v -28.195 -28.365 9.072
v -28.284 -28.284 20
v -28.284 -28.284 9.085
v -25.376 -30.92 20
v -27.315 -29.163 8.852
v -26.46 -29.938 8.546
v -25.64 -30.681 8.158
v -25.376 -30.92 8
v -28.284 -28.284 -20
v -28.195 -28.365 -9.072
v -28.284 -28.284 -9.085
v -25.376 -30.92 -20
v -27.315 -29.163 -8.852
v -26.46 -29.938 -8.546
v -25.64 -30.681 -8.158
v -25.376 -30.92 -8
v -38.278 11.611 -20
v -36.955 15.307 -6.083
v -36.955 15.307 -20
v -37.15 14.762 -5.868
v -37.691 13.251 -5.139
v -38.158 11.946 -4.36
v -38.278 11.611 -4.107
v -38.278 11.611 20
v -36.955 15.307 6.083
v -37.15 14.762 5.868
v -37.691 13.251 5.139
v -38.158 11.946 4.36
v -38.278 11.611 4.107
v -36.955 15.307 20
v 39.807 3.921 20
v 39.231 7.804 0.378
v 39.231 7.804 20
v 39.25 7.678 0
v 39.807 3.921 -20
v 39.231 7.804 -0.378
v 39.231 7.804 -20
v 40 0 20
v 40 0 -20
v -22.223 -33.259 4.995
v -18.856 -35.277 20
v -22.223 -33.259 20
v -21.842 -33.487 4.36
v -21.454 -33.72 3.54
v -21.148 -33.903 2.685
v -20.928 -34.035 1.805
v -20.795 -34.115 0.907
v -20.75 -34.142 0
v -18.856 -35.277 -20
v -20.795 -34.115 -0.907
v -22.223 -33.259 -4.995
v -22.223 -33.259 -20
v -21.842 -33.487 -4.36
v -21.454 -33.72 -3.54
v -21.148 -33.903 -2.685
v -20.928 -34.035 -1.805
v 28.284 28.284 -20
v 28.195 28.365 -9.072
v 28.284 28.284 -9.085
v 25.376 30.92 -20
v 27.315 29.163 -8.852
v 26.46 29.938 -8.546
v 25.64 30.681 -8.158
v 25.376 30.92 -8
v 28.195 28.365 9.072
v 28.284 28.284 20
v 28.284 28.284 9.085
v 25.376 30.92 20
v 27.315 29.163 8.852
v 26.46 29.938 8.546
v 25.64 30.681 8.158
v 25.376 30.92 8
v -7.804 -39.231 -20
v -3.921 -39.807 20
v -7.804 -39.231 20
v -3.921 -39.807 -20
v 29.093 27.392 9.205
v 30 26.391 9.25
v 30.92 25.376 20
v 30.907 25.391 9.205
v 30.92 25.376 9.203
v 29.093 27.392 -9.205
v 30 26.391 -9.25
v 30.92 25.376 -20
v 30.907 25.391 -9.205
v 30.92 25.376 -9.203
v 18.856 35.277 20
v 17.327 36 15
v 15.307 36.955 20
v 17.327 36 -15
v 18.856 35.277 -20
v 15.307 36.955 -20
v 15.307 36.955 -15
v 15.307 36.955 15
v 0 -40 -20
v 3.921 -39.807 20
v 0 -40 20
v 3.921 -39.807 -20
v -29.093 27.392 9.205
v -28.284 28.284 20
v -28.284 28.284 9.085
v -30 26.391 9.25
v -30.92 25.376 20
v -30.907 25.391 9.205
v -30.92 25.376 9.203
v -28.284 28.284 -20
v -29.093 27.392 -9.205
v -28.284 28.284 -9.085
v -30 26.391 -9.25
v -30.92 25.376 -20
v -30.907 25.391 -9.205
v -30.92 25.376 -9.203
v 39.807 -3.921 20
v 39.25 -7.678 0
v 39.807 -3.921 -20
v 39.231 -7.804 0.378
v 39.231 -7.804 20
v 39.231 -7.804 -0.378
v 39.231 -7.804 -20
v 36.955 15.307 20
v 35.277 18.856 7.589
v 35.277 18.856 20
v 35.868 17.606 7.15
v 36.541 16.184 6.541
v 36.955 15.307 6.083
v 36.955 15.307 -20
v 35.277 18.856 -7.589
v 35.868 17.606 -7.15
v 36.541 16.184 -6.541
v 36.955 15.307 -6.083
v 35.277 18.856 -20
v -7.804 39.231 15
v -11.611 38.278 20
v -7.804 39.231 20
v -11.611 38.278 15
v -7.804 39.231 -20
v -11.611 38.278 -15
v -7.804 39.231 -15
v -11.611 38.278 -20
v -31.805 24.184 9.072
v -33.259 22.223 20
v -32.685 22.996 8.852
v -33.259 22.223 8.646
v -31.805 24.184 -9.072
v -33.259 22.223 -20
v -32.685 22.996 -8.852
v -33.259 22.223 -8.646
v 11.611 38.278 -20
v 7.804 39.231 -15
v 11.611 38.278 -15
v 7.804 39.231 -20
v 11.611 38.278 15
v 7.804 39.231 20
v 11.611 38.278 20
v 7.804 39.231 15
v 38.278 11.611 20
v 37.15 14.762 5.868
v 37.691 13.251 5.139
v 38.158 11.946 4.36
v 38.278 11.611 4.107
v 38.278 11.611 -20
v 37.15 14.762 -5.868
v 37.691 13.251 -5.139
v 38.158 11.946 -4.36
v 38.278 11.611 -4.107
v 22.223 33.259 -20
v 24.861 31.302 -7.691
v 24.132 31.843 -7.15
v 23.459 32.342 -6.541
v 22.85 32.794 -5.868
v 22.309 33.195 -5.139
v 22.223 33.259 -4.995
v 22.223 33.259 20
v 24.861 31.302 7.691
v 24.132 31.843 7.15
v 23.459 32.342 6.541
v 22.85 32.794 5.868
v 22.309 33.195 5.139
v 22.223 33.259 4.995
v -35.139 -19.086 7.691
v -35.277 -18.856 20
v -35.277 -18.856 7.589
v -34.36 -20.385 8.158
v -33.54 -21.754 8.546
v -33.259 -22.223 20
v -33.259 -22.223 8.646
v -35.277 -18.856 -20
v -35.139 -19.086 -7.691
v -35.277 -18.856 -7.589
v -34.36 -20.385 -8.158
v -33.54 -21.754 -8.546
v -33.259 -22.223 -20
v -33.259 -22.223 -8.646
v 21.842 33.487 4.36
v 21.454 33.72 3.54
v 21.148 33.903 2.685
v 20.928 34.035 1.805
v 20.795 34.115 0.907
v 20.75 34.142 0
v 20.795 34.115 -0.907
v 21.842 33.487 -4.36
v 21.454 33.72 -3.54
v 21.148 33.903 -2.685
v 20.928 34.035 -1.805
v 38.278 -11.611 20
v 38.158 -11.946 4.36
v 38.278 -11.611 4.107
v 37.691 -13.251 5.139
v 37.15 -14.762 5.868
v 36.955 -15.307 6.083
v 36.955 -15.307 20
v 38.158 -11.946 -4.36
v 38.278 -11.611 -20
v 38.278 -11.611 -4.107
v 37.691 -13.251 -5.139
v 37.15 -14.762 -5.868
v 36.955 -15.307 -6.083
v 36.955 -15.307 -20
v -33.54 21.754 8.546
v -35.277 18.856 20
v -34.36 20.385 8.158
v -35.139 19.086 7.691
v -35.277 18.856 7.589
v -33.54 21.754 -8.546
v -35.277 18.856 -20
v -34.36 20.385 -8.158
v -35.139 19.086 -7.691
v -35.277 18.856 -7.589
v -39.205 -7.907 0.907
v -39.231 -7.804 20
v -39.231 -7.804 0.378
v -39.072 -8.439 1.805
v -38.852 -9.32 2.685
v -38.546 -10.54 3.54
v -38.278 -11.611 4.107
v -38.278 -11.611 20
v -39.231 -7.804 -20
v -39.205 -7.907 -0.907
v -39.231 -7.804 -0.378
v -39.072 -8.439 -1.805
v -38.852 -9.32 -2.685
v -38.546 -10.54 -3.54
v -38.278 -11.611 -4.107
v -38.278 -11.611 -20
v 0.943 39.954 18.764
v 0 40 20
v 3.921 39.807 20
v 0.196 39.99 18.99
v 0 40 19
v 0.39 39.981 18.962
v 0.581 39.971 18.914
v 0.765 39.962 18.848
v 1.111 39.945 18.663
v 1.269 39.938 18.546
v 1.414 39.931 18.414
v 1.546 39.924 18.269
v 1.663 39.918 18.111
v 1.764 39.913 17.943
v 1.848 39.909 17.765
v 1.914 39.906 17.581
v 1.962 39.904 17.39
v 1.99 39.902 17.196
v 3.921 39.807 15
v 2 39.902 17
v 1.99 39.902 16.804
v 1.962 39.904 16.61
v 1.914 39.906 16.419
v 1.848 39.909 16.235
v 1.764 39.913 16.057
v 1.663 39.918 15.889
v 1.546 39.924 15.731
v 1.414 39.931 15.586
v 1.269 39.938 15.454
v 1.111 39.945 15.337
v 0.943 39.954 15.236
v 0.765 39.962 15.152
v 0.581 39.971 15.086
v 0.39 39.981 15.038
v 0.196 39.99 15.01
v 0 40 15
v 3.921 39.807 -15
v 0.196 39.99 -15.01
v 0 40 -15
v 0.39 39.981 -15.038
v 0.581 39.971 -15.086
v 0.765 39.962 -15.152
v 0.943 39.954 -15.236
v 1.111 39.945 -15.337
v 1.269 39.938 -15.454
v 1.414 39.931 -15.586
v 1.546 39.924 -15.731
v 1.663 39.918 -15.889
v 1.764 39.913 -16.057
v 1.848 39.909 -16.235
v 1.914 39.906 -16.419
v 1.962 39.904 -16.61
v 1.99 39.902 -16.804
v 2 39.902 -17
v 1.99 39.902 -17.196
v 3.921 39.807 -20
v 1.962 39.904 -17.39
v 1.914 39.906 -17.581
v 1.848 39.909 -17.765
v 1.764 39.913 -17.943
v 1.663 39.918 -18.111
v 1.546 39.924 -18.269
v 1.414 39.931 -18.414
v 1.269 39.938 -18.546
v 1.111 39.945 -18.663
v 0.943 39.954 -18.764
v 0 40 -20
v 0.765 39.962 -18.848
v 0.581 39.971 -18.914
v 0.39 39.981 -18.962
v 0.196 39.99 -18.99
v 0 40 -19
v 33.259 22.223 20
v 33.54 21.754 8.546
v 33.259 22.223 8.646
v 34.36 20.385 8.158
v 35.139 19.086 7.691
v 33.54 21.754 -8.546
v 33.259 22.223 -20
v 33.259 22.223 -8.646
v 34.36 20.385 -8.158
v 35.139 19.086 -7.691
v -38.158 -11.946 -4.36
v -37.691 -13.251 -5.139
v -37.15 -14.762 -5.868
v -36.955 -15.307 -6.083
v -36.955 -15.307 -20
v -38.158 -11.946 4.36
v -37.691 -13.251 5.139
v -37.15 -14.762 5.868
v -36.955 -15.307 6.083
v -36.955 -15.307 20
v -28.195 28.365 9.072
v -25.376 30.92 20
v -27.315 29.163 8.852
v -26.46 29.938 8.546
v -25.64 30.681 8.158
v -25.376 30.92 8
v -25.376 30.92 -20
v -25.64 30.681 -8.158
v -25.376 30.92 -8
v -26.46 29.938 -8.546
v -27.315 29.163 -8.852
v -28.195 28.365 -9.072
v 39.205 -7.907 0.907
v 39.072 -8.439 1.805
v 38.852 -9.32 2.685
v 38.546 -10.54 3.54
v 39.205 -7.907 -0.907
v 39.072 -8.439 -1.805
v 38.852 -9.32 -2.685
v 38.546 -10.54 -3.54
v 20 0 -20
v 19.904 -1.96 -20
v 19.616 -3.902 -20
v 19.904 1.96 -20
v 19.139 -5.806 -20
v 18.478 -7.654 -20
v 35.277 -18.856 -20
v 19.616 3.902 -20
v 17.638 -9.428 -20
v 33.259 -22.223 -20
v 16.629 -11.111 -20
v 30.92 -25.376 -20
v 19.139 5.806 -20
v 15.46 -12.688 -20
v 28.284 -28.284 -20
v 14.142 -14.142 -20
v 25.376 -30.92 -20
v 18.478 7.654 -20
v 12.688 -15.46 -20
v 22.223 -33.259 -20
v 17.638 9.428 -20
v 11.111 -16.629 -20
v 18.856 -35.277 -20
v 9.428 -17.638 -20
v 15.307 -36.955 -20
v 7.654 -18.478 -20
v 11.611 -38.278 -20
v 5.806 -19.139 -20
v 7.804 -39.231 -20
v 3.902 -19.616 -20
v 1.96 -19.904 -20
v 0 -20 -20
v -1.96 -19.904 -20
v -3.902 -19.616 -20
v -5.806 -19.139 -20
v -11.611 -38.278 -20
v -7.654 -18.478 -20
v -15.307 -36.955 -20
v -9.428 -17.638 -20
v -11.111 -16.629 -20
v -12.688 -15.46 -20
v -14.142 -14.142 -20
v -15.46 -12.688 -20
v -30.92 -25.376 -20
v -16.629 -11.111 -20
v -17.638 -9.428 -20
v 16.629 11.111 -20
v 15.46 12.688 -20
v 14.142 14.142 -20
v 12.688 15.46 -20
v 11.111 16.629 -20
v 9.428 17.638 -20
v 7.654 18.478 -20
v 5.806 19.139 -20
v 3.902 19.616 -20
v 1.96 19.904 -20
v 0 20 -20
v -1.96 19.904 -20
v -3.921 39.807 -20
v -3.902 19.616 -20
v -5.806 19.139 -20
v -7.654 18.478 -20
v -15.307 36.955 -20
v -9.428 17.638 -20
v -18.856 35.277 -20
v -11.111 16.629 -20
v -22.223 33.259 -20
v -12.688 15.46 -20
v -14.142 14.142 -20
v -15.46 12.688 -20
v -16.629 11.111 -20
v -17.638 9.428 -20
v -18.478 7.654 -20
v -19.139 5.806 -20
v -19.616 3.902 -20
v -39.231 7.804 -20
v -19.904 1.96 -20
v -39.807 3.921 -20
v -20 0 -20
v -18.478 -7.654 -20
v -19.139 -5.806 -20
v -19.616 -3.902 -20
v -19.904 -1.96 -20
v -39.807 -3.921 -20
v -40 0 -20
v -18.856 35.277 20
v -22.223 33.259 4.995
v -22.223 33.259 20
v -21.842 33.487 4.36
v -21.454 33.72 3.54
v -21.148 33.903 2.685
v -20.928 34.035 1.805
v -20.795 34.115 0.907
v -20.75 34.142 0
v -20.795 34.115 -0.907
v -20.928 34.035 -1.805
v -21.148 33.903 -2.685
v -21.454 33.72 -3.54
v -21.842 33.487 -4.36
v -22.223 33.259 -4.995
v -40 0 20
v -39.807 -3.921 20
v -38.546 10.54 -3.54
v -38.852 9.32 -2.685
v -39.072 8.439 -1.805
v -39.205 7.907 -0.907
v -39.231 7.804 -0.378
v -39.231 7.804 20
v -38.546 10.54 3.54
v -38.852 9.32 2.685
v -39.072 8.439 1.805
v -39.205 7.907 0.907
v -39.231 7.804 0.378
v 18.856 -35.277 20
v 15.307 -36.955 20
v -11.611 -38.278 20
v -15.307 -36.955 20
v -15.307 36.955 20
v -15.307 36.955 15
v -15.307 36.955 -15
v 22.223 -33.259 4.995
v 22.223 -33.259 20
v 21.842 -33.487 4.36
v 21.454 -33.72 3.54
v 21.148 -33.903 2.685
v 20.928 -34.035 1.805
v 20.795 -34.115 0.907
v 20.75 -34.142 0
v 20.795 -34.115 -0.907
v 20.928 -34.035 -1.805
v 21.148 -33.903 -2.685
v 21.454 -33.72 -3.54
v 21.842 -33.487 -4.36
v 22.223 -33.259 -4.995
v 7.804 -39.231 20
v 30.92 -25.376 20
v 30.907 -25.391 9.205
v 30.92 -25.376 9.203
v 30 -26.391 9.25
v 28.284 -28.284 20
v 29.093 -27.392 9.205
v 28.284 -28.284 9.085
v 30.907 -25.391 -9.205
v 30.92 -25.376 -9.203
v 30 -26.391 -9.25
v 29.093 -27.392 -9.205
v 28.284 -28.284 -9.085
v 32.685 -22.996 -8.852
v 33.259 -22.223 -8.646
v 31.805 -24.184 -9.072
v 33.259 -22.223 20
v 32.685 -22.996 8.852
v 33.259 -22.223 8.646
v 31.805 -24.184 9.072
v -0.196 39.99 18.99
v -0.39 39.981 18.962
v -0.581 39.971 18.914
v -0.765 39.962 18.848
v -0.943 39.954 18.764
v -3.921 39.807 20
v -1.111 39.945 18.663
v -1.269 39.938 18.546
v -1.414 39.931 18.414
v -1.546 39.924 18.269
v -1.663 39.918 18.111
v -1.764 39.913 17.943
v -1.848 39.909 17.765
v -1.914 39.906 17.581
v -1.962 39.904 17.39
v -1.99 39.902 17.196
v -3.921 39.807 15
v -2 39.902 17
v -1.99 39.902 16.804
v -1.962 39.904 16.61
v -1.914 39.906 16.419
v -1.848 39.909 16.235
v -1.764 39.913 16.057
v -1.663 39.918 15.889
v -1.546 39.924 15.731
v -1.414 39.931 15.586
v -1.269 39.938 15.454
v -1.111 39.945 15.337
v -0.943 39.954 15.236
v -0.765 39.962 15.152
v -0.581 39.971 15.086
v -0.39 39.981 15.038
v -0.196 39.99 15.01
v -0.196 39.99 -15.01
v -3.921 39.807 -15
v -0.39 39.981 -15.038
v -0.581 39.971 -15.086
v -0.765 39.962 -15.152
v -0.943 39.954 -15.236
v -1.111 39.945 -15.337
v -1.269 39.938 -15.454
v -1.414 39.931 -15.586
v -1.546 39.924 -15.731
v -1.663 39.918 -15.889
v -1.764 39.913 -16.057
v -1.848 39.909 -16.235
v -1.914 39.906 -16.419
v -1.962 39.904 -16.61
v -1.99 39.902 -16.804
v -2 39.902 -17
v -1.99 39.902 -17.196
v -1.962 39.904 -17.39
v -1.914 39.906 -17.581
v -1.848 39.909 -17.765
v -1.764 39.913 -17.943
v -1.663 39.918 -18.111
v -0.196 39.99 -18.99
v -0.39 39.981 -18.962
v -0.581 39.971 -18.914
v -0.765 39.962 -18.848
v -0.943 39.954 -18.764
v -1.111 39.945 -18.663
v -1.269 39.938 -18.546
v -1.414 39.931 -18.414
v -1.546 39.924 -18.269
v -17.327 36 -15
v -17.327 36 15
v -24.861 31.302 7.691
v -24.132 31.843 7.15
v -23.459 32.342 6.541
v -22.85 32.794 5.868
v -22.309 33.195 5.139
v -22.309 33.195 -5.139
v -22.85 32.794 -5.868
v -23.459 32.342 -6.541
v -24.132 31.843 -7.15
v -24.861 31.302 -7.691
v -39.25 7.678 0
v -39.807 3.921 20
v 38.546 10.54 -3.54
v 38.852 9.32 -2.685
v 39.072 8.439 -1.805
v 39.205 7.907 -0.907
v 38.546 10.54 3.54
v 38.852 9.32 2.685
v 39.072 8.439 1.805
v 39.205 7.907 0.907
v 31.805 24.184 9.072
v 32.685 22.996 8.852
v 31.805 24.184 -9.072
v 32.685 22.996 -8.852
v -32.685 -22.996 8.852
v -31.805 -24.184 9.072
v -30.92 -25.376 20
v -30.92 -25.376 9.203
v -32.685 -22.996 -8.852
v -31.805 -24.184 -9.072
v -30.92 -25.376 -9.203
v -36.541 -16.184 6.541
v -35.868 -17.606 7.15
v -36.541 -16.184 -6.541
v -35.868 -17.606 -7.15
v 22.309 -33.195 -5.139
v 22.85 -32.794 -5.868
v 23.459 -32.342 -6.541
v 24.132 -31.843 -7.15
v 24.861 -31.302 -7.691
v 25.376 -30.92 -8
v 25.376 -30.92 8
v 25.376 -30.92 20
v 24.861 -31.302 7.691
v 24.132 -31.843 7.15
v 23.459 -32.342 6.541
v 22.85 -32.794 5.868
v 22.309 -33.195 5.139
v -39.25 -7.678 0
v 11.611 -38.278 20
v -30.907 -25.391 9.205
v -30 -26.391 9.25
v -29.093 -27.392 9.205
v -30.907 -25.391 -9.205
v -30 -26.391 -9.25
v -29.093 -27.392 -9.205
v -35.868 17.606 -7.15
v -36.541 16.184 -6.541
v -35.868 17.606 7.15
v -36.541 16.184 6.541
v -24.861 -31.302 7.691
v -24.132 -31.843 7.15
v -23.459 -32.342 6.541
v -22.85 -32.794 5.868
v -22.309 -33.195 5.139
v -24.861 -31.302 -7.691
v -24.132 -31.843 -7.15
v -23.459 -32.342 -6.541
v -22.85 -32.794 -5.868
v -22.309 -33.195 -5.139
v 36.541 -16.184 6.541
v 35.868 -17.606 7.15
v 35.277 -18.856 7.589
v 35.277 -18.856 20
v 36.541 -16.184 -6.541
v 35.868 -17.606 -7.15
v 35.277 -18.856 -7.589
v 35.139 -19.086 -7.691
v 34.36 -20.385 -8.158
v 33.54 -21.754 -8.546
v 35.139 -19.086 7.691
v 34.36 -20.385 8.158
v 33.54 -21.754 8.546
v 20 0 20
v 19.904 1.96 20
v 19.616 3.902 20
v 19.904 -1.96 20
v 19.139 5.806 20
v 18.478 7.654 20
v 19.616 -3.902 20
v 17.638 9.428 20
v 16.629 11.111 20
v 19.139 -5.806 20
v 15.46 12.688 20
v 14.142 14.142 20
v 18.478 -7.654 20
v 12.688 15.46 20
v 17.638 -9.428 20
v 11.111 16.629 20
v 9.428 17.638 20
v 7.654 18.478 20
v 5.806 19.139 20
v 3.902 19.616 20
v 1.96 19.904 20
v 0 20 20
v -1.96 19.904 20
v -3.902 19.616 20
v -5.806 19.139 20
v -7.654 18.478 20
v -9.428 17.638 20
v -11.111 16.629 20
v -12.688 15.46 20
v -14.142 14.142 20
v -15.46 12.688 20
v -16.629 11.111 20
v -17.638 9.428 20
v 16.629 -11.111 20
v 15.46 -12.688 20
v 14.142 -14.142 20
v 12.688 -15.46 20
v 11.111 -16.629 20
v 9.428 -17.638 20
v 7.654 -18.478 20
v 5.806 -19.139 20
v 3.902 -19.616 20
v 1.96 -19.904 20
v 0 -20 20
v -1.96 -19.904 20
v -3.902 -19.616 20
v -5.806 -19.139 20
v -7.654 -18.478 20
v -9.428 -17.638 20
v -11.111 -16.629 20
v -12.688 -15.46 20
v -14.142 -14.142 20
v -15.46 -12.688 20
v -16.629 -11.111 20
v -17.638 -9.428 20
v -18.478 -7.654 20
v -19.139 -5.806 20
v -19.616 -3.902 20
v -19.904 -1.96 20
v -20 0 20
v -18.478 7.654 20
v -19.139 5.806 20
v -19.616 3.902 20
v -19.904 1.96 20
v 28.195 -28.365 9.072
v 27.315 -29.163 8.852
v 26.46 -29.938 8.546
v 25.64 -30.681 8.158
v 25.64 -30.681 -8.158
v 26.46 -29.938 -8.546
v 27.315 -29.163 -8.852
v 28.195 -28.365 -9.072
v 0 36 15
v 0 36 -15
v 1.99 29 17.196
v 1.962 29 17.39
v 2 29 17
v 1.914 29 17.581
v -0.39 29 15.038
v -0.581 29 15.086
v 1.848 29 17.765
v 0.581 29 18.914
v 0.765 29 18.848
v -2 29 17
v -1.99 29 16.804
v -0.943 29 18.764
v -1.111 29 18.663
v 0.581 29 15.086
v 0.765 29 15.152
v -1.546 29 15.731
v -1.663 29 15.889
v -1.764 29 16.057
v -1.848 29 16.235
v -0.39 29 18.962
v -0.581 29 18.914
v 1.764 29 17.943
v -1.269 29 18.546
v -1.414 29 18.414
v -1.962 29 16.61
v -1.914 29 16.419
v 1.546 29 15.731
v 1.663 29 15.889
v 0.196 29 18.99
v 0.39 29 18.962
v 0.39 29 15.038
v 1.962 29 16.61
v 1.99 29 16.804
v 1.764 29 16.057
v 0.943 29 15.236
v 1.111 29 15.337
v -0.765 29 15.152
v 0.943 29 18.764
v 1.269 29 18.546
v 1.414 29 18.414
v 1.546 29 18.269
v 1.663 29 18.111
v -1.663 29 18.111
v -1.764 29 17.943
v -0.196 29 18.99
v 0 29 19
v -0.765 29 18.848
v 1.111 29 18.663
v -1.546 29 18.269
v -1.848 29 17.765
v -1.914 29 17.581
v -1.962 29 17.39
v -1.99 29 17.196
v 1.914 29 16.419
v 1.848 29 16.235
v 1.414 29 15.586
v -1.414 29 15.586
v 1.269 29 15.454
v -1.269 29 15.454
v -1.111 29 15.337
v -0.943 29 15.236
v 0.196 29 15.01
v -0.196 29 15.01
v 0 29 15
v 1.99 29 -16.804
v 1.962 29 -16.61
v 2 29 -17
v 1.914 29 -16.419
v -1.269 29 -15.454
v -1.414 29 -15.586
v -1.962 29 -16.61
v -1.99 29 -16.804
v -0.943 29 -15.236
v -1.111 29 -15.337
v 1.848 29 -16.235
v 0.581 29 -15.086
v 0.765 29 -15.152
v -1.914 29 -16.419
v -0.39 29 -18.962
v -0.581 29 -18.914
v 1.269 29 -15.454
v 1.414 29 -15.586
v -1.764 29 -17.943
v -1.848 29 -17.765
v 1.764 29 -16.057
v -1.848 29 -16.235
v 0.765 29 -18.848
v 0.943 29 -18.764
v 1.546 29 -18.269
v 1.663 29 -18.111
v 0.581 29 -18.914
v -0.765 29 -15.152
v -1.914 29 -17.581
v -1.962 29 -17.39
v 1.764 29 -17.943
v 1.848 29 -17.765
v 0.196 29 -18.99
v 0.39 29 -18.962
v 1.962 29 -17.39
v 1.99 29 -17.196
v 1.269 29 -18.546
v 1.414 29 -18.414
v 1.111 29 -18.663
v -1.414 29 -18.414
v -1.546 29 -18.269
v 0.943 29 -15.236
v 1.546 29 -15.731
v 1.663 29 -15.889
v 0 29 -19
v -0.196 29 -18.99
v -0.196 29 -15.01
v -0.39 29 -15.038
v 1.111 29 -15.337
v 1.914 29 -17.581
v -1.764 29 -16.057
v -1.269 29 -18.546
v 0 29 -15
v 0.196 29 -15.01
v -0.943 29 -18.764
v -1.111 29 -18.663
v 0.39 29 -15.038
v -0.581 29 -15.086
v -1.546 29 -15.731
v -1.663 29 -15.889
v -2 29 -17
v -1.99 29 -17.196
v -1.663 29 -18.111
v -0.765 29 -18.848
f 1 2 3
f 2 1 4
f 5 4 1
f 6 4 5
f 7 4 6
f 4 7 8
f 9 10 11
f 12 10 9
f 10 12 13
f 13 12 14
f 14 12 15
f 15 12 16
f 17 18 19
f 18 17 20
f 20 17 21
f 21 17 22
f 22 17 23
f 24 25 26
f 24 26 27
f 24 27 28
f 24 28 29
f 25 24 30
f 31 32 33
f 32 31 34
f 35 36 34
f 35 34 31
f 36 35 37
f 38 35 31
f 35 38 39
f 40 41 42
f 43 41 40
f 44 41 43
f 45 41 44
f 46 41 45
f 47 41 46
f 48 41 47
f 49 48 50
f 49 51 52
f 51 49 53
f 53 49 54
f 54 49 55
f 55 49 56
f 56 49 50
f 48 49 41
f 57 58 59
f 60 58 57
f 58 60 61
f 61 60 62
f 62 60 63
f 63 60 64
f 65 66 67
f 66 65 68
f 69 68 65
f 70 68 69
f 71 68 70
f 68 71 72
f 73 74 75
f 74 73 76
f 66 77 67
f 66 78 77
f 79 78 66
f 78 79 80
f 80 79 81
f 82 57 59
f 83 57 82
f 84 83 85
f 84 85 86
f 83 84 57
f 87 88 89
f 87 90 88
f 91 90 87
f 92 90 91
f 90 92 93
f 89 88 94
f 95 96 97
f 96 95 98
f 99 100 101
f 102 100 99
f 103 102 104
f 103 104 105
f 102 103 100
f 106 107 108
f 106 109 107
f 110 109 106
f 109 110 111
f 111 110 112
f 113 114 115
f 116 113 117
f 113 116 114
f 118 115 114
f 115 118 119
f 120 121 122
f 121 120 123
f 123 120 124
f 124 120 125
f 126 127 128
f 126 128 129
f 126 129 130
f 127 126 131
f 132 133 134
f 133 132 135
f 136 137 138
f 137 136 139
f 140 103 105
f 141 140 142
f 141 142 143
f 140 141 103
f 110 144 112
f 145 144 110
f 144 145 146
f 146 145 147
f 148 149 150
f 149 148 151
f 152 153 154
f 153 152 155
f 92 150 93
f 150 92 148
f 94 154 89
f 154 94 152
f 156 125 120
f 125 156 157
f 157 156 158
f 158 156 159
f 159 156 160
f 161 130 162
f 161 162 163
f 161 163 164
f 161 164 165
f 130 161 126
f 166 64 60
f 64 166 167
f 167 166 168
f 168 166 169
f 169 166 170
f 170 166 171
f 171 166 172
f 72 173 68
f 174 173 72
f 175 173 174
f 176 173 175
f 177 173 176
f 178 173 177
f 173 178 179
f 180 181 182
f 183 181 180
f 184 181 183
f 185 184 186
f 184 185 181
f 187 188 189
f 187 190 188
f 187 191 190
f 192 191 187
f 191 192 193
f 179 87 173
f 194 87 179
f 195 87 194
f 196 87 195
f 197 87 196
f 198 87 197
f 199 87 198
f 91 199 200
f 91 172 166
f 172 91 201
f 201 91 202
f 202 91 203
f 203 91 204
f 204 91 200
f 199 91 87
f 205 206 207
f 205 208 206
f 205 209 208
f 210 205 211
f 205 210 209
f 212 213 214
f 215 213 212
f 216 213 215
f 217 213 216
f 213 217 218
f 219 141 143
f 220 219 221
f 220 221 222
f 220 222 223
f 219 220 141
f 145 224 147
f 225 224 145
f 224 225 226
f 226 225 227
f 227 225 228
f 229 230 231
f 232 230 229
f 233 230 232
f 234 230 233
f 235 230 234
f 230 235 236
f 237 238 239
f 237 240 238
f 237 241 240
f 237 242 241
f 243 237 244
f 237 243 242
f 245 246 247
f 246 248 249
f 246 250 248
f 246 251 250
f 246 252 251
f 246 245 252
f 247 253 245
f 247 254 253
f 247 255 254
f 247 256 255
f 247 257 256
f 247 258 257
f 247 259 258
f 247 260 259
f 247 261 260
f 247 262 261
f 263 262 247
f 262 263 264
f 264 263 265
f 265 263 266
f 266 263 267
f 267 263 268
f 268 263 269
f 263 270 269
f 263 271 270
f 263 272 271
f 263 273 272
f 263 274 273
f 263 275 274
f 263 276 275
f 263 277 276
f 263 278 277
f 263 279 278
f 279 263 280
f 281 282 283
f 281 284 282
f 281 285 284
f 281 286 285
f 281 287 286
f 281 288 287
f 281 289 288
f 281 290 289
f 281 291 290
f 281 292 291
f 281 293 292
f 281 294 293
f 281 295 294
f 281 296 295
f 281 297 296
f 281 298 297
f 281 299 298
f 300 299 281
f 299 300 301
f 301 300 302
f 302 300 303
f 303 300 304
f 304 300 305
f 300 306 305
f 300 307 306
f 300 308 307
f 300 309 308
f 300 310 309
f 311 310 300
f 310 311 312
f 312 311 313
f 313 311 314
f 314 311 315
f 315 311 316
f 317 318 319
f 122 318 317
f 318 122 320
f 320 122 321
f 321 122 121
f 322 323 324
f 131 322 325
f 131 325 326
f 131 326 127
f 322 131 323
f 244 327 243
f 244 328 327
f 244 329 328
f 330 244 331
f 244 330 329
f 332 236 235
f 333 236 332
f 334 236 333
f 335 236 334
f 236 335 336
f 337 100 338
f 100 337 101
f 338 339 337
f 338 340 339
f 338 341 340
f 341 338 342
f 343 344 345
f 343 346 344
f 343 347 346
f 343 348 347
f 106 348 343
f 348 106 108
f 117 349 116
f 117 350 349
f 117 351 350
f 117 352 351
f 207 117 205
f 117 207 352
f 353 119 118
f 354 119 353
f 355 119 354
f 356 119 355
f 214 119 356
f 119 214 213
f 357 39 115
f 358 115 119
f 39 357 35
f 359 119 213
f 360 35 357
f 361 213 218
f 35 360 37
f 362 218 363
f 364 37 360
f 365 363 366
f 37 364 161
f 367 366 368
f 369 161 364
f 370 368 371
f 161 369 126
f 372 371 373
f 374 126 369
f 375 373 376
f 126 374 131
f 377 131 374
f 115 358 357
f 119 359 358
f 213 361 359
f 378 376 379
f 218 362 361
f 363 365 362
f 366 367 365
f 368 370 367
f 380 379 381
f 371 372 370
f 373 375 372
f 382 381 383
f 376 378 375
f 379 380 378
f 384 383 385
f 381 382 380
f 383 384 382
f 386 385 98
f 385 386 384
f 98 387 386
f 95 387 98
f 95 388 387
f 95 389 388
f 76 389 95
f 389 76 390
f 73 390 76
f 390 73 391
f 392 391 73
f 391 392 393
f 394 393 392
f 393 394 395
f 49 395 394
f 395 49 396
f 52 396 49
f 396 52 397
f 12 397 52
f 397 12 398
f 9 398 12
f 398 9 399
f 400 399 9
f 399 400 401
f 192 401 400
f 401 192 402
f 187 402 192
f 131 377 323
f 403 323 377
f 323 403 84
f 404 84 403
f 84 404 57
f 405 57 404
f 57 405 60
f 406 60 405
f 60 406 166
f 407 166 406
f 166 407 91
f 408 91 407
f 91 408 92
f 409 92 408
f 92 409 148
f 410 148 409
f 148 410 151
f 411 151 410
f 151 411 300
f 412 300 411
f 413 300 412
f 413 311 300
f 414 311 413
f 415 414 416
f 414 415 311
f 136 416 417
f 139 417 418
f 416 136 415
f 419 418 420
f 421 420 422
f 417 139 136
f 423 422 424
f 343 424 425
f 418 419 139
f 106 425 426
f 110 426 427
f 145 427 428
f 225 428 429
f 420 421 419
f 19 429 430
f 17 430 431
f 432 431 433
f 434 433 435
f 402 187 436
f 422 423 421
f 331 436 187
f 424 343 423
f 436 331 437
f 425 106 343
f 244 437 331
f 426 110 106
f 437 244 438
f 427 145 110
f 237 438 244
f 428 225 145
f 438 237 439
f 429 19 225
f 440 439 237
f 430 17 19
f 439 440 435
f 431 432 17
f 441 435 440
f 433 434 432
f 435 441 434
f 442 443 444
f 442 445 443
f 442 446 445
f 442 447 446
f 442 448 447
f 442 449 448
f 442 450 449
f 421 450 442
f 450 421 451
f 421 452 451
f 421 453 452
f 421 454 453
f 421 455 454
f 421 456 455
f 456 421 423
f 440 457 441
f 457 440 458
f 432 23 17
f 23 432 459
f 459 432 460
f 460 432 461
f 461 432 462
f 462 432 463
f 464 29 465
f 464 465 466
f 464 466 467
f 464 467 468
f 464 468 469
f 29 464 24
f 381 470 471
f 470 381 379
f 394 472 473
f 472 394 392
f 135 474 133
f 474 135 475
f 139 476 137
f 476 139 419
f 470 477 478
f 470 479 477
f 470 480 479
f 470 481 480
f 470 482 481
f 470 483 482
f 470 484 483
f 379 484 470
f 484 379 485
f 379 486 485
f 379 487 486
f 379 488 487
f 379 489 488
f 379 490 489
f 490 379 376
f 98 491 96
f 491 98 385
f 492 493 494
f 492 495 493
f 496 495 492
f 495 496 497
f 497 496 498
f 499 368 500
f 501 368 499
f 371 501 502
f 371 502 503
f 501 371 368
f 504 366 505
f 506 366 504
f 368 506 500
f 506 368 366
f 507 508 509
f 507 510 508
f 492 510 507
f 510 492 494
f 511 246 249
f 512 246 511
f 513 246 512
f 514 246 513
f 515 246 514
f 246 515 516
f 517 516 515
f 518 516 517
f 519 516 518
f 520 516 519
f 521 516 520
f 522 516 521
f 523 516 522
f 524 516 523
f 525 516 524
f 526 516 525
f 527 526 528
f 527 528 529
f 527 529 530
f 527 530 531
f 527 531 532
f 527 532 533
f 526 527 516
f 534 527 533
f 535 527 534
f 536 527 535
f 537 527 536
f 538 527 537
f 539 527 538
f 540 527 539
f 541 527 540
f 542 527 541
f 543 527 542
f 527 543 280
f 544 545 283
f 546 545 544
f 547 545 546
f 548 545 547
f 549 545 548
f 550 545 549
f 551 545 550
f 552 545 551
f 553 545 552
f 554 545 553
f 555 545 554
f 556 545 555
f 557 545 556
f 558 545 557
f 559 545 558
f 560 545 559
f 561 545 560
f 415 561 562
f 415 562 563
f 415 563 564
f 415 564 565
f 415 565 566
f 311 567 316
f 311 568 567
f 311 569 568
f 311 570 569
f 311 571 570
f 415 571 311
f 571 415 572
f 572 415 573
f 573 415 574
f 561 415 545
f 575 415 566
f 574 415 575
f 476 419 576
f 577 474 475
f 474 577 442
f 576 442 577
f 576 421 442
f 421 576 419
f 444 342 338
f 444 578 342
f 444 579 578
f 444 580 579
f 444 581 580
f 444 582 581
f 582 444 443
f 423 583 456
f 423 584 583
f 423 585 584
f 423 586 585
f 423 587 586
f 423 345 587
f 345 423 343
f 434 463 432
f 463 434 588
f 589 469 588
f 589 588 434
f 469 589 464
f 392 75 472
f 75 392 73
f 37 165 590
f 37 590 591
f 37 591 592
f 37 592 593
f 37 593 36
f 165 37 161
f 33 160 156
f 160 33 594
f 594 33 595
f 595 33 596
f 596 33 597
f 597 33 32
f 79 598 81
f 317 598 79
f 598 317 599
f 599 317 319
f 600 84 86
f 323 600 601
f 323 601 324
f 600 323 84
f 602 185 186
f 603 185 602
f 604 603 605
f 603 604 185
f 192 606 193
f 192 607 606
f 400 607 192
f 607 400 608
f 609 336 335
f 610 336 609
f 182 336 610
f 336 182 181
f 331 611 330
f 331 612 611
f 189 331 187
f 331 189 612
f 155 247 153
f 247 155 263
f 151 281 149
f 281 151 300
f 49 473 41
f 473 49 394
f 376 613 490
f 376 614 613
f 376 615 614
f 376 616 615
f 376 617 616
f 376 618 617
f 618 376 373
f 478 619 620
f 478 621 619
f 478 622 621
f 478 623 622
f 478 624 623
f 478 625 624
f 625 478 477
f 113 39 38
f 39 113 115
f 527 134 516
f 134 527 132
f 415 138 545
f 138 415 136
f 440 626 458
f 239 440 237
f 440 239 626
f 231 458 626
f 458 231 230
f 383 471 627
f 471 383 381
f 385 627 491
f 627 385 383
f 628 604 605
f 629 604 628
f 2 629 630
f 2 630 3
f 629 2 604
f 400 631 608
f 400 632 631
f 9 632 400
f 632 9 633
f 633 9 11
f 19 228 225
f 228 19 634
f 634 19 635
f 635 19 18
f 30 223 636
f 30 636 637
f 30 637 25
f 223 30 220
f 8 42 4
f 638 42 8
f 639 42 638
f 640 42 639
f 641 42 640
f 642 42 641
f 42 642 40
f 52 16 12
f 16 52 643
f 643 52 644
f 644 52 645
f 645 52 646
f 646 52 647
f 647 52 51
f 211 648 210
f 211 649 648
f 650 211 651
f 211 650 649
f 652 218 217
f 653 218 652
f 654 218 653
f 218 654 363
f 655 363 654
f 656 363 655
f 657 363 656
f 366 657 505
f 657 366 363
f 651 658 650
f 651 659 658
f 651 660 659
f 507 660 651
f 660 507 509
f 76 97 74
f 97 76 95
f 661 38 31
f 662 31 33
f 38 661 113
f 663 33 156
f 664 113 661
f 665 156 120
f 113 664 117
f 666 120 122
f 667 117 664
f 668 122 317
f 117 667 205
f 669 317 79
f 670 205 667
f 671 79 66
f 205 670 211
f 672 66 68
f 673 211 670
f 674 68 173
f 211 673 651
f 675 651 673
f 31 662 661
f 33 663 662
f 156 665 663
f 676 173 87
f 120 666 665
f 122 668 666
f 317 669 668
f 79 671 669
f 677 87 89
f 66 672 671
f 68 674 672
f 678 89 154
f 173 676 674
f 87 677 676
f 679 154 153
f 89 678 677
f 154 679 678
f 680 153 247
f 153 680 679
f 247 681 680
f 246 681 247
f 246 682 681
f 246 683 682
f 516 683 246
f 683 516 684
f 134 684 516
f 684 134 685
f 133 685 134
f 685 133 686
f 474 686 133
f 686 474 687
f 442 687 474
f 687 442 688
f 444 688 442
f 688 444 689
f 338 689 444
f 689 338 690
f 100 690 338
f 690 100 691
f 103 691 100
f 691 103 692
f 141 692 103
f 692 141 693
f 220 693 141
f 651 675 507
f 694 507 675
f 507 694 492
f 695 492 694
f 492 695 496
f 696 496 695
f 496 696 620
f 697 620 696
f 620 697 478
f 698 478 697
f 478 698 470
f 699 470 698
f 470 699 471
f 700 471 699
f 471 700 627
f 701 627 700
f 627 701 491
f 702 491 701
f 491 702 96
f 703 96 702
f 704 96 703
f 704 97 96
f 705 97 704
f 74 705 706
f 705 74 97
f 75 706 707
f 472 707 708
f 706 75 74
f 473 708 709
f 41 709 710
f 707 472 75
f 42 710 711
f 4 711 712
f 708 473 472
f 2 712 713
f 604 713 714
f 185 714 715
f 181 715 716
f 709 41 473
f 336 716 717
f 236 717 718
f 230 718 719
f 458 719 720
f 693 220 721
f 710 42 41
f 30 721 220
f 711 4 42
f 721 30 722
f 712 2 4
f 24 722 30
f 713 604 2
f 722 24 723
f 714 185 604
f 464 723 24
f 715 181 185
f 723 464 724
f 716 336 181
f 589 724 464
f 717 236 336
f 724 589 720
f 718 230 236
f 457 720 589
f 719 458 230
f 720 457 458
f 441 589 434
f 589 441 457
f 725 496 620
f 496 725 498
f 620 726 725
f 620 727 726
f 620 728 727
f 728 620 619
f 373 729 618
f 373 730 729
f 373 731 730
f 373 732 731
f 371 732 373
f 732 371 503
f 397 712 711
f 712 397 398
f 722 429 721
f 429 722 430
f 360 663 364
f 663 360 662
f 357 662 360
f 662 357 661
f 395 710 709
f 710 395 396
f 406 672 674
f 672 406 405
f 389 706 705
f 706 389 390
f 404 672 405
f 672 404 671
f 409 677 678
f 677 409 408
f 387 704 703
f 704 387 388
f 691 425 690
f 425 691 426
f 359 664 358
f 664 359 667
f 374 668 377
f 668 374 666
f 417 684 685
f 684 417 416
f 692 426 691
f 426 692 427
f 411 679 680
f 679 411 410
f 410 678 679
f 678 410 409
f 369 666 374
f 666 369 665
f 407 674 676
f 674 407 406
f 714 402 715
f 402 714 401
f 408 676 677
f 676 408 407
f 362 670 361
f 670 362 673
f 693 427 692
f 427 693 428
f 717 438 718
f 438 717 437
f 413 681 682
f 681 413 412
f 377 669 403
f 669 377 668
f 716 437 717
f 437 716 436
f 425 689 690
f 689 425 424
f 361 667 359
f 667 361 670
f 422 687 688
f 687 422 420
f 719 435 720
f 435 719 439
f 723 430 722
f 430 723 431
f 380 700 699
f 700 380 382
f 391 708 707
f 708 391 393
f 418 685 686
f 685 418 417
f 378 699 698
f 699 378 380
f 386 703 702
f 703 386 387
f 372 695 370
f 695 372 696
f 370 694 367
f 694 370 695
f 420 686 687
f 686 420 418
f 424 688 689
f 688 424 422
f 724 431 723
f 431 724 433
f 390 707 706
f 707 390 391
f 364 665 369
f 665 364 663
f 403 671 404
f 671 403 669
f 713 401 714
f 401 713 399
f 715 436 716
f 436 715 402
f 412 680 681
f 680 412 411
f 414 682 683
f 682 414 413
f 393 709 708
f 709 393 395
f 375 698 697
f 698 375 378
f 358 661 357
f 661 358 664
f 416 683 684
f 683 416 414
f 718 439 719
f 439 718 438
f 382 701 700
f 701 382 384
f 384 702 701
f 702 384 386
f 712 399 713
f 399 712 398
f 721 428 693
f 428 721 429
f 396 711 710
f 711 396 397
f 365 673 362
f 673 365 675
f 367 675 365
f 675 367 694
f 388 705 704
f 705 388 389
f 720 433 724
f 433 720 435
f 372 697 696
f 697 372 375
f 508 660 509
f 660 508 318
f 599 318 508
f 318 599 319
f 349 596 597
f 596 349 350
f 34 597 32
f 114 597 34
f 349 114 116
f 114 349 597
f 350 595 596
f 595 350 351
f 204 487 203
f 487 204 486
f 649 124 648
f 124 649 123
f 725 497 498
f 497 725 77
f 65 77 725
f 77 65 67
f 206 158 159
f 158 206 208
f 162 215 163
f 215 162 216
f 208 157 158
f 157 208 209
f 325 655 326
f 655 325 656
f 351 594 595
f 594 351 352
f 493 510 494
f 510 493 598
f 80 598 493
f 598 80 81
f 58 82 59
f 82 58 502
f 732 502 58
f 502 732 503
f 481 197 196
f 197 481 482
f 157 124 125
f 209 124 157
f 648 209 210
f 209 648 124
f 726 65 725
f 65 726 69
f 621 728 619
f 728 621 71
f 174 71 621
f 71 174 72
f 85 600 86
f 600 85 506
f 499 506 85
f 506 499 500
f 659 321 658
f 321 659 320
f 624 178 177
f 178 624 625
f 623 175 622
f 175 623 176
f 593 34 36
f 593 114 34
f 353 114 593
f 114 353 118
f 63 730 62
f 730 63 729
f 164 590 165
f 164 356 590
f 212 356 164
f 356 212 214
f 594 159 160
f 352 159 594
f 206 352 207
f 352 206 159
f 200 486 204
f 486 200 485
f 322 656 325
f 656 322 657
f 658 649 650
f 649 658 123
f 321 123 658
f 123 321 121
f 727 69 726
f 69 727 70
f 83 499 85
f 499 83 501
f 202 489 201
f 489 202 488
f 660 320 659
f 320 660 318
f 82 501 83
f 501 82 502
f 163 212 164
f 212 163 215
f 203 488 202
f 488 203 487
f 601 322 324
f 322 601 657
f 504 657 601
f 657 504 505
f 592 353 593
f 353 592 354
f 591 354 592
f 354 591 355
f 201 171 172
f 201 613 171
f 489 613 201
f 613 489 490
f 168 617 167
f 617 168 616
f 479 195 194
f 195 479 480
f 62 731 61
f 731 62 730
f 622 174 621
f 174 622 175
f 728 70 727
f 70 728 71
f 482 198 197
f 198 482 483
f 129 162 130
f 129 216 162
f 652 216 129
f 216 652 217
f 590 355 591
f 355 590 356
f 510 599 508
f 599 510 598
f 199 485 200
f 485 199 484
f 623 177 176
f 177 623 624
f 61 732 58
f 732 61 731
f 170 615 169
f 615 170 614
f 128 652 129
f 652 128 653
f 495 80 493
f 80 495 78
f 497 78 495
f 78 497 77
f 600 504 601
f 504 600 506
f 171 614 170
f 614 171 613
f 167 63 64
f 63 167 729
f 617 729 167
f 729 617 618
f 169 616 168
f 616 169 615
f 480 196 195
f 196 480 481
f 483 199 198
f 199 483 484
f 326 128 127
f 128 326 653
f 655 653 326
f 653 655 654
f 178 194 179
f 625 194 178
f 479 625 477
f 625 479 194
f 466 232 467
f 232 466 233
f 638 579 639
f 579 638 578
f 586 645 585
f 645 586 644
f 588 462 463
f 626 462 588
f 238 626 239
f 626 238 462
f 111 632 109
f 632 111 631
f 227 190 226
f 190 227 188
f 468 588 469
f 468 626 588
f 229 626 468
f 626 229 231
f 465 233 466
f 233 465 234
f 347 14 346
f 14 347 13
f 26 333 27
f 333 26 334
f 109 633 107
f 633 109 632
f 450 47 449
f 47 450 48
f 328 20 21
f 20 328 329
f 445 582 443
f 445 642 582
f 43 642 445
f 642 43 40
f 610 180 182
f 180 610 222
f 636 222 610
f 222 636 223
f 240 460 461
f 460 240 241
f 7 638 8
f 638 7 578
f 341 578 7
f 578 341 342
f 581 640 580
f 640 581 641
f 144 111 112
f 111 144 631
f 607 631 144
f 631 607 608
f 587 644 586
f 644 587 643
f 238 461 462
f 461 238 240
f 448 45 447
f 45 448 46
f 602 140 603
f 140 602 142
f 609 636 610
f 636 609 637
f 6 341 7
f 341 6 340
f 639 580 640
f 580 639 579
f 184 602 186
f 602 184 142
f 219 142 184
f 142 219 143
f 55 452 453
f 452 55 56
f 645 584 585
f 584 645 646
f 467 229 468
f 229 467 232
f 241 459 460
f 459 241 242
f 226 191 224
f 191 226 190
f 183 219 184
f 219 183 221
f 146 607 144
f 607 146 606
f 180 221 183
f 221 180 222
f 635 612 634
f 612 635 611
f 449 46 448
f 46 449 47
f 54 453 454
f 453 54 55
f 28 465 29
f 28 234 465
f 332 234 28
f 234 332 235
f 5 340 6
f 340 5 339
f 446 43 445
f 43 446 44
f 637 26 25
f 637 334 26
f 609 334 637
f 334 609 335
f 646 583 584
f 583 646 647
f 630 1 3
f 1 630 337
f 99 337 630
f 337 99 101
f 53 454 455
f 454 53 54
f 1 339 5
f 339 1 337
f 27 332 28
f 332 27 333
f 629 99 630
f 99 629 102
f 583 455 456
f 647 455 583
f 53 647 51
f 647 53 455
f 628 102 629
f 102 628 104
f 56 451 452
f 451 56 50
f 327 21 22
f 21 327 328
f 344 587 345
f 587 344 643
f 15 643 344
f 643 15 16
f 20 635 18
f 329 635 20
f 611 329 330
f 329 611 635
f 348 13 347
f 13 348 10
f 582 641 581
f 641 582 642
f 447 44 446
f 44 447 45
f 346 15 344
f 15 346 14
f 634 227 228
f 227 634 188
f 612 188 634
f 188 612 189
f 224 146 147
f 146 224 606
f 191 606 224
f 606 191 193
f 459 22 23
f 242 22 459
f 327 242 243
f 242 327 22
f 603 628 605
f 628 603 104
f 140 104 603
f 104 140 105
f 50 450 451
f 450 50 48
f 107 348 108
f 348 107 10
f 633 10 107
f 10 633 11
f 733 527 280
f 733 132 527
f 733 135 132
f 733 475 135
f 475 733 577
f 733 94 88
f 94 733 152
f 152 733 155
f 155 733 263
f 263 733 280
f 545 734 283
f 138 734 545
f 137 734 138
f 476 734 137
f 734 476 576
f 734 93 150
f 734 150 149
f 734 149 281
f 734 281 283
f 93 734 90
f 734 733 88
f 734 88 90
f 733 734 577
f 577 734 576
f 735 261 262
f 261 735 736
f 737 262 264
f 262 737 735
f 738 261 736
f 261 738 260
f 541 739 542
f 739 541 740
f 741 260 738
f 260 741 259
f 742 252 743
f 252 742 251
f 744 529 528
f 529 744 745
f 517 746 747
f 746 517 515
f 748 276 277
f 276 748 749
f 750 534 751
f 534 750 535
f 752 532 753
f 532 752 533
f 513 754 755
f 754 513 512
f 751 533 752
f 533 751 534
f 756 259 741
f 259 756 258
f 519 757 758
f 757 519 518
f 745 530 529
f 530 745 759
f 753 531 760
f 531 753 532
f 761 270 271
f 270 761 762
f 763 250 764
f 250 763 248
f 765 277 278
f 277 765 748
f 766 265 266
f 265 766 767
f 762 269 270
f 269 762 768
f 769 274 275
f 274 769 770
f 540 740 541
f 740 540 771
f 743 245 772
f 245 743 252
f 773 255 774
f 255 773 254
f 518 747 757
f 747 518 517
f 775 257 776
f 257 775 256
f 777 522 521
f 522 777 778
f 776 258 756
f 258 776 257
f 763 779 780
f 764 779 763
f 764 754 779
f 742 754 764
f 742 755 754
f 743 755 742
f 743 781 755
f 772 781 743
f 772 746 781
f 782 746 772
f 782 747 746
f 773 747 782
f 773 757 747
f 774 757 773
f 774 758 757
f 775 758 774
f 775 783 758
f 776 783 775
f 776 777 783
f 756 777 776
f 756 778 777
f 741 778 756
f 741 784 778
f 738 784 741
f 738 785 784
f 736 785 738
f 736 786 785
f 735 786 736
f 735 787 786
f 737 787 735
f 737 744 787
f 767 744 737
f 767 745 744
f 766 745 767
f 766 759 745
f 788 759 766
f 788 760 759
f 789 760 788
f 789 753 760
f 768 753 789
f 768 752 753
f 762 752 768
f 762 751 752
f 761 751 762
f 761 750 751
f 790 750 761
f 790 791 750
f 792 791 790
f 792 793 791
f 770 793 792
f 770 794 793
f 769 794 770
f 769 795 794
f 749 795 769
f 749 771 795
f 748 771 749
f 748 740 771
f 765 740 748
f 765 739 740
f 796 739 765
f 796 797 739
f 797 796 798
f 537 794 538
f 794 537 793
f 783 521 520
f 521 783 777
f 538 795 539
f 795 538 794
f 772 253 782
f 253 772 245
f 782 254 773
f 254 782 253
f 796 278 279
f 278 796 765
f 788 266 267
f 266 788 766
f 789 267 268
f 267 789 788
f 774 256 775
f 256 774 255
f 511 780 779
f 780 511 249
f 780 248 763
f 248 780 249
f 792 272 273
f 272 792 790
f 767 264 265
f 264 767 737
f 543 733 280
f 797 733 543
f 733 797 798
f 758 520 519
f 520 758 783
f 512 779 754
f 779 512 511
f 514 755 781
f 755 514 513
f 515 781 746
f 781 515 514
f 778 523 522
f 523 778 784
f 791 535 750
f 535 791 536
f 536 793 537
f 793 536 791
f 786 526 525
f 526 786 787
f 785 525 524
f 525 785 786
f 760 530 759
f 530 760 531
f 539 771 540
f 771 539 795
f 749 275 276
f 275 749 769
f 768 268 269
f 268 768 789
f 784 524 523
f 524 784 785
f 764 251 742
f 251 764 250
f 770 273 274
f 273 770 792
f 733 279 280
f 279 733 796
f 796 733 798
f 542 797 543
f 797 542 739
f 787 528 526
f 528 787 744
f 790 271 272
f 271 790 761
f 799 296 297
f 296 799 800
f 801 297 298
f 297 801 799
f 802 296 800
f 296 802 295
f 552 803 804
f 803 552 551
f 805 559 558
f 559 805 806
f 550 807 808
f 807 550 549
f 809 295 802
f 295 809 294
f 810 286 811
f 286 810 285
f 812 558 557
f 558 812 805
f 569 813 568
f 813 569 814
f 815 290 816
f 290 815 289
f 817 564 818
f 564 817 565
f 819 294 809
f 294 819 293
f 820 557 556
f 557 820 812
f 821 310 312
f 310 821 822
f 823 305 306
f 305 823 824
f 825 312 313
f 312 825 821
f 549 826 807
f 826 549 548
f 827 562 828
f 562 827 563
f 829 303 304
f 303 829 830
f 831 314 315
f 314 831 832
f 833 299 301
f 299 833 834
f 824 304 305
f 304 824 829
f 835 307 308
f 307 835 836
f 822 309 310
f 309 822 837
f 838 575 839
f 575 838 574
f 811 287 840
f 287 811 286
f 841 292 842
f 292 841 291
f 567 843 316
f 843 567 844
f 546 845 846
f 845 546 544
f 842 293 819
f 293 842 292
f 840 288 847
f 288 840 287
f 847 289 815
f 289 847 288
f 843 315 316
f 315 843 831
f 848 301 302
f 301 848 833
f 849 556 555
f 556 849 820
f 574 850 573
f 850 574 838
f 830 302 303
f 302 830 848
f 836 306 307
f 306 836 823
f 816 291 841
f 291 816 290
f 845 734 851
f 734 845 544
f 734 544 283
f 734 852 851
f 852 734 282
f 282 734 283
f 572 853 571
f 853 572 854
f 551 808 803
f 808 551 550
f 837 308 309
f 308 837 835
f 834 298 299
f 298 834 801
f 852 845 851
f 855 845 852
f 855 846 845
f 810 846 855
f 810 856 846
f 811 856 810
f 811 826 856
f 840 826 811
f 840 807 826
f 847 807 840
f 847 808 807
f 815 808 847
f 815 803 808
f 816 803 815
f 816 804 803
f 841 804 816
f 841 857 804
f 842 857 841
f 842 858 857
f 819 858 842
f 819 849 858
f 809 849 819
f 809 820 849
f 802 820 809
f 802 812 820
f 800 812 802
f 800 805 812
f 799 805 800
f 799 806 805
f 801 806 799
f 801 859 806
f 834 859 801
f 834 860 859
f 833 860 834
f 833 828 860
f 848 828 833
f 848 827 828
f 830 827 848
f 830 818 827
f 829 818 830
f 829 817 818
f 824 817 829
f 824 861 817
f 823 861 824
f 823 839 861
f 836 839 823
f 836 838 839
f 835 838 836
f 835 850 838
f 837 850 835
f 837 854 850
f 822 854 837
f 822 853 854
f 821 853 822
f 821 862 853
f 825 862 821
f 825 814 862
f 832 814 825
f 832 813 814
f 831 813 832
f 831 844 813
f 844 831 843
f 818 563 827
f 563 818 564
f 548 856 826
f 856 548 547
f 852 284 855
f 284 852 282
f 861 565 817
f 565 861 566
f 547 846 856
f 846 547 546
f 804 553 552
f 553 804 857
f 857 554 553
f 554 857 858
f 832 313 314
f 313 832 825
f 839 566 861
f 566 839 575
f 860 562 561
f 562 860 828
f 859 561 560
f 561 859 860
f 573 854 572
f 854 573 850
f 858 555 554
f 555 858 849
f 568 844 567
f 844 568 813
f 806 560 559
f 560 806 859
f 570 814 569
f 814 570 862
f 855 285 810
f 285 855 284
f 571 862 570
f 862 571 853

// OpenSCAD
// COBRA Vertebra - T4 V10
// Height: 40.0mm, OD: 80.0mm

$fn = 64;

difference() {
    // Outer cylinder
    cylinder(h=40.0, d=80.0, center=true);
    
    // Inner channel
    cylinder(h=42.0, d=40.0, center=true);

    // Battery cavity 1
    rotate([0, 0, 0])
    translate([30.0, 0, 0])
    rotate([90, 0, 0])
    cylinder(h=74.0, d=18.5, center=true);

    // Battery cavity 2
    rotate([0, 0, 180])
    translate([30.0, 0, 0])
    rotate([90, 0, 0])
    cylinder(h=74.0, d=18.5, center=true);

    // Solar panel cavity
    translate([0, 38.0, 0])
    cube([50, 4, 30], center=true);

    // Pivot holes
    translate([0, 40.0, 17.0])
    rotate([90, 0, 0])
    cylinder(h=22.0, d=4, center=true);
    
    translate([0, 40.0, -17.0])
    rotate([90, 0, 0])
    cylinder(h=22.0, d=4, center=true);
}
